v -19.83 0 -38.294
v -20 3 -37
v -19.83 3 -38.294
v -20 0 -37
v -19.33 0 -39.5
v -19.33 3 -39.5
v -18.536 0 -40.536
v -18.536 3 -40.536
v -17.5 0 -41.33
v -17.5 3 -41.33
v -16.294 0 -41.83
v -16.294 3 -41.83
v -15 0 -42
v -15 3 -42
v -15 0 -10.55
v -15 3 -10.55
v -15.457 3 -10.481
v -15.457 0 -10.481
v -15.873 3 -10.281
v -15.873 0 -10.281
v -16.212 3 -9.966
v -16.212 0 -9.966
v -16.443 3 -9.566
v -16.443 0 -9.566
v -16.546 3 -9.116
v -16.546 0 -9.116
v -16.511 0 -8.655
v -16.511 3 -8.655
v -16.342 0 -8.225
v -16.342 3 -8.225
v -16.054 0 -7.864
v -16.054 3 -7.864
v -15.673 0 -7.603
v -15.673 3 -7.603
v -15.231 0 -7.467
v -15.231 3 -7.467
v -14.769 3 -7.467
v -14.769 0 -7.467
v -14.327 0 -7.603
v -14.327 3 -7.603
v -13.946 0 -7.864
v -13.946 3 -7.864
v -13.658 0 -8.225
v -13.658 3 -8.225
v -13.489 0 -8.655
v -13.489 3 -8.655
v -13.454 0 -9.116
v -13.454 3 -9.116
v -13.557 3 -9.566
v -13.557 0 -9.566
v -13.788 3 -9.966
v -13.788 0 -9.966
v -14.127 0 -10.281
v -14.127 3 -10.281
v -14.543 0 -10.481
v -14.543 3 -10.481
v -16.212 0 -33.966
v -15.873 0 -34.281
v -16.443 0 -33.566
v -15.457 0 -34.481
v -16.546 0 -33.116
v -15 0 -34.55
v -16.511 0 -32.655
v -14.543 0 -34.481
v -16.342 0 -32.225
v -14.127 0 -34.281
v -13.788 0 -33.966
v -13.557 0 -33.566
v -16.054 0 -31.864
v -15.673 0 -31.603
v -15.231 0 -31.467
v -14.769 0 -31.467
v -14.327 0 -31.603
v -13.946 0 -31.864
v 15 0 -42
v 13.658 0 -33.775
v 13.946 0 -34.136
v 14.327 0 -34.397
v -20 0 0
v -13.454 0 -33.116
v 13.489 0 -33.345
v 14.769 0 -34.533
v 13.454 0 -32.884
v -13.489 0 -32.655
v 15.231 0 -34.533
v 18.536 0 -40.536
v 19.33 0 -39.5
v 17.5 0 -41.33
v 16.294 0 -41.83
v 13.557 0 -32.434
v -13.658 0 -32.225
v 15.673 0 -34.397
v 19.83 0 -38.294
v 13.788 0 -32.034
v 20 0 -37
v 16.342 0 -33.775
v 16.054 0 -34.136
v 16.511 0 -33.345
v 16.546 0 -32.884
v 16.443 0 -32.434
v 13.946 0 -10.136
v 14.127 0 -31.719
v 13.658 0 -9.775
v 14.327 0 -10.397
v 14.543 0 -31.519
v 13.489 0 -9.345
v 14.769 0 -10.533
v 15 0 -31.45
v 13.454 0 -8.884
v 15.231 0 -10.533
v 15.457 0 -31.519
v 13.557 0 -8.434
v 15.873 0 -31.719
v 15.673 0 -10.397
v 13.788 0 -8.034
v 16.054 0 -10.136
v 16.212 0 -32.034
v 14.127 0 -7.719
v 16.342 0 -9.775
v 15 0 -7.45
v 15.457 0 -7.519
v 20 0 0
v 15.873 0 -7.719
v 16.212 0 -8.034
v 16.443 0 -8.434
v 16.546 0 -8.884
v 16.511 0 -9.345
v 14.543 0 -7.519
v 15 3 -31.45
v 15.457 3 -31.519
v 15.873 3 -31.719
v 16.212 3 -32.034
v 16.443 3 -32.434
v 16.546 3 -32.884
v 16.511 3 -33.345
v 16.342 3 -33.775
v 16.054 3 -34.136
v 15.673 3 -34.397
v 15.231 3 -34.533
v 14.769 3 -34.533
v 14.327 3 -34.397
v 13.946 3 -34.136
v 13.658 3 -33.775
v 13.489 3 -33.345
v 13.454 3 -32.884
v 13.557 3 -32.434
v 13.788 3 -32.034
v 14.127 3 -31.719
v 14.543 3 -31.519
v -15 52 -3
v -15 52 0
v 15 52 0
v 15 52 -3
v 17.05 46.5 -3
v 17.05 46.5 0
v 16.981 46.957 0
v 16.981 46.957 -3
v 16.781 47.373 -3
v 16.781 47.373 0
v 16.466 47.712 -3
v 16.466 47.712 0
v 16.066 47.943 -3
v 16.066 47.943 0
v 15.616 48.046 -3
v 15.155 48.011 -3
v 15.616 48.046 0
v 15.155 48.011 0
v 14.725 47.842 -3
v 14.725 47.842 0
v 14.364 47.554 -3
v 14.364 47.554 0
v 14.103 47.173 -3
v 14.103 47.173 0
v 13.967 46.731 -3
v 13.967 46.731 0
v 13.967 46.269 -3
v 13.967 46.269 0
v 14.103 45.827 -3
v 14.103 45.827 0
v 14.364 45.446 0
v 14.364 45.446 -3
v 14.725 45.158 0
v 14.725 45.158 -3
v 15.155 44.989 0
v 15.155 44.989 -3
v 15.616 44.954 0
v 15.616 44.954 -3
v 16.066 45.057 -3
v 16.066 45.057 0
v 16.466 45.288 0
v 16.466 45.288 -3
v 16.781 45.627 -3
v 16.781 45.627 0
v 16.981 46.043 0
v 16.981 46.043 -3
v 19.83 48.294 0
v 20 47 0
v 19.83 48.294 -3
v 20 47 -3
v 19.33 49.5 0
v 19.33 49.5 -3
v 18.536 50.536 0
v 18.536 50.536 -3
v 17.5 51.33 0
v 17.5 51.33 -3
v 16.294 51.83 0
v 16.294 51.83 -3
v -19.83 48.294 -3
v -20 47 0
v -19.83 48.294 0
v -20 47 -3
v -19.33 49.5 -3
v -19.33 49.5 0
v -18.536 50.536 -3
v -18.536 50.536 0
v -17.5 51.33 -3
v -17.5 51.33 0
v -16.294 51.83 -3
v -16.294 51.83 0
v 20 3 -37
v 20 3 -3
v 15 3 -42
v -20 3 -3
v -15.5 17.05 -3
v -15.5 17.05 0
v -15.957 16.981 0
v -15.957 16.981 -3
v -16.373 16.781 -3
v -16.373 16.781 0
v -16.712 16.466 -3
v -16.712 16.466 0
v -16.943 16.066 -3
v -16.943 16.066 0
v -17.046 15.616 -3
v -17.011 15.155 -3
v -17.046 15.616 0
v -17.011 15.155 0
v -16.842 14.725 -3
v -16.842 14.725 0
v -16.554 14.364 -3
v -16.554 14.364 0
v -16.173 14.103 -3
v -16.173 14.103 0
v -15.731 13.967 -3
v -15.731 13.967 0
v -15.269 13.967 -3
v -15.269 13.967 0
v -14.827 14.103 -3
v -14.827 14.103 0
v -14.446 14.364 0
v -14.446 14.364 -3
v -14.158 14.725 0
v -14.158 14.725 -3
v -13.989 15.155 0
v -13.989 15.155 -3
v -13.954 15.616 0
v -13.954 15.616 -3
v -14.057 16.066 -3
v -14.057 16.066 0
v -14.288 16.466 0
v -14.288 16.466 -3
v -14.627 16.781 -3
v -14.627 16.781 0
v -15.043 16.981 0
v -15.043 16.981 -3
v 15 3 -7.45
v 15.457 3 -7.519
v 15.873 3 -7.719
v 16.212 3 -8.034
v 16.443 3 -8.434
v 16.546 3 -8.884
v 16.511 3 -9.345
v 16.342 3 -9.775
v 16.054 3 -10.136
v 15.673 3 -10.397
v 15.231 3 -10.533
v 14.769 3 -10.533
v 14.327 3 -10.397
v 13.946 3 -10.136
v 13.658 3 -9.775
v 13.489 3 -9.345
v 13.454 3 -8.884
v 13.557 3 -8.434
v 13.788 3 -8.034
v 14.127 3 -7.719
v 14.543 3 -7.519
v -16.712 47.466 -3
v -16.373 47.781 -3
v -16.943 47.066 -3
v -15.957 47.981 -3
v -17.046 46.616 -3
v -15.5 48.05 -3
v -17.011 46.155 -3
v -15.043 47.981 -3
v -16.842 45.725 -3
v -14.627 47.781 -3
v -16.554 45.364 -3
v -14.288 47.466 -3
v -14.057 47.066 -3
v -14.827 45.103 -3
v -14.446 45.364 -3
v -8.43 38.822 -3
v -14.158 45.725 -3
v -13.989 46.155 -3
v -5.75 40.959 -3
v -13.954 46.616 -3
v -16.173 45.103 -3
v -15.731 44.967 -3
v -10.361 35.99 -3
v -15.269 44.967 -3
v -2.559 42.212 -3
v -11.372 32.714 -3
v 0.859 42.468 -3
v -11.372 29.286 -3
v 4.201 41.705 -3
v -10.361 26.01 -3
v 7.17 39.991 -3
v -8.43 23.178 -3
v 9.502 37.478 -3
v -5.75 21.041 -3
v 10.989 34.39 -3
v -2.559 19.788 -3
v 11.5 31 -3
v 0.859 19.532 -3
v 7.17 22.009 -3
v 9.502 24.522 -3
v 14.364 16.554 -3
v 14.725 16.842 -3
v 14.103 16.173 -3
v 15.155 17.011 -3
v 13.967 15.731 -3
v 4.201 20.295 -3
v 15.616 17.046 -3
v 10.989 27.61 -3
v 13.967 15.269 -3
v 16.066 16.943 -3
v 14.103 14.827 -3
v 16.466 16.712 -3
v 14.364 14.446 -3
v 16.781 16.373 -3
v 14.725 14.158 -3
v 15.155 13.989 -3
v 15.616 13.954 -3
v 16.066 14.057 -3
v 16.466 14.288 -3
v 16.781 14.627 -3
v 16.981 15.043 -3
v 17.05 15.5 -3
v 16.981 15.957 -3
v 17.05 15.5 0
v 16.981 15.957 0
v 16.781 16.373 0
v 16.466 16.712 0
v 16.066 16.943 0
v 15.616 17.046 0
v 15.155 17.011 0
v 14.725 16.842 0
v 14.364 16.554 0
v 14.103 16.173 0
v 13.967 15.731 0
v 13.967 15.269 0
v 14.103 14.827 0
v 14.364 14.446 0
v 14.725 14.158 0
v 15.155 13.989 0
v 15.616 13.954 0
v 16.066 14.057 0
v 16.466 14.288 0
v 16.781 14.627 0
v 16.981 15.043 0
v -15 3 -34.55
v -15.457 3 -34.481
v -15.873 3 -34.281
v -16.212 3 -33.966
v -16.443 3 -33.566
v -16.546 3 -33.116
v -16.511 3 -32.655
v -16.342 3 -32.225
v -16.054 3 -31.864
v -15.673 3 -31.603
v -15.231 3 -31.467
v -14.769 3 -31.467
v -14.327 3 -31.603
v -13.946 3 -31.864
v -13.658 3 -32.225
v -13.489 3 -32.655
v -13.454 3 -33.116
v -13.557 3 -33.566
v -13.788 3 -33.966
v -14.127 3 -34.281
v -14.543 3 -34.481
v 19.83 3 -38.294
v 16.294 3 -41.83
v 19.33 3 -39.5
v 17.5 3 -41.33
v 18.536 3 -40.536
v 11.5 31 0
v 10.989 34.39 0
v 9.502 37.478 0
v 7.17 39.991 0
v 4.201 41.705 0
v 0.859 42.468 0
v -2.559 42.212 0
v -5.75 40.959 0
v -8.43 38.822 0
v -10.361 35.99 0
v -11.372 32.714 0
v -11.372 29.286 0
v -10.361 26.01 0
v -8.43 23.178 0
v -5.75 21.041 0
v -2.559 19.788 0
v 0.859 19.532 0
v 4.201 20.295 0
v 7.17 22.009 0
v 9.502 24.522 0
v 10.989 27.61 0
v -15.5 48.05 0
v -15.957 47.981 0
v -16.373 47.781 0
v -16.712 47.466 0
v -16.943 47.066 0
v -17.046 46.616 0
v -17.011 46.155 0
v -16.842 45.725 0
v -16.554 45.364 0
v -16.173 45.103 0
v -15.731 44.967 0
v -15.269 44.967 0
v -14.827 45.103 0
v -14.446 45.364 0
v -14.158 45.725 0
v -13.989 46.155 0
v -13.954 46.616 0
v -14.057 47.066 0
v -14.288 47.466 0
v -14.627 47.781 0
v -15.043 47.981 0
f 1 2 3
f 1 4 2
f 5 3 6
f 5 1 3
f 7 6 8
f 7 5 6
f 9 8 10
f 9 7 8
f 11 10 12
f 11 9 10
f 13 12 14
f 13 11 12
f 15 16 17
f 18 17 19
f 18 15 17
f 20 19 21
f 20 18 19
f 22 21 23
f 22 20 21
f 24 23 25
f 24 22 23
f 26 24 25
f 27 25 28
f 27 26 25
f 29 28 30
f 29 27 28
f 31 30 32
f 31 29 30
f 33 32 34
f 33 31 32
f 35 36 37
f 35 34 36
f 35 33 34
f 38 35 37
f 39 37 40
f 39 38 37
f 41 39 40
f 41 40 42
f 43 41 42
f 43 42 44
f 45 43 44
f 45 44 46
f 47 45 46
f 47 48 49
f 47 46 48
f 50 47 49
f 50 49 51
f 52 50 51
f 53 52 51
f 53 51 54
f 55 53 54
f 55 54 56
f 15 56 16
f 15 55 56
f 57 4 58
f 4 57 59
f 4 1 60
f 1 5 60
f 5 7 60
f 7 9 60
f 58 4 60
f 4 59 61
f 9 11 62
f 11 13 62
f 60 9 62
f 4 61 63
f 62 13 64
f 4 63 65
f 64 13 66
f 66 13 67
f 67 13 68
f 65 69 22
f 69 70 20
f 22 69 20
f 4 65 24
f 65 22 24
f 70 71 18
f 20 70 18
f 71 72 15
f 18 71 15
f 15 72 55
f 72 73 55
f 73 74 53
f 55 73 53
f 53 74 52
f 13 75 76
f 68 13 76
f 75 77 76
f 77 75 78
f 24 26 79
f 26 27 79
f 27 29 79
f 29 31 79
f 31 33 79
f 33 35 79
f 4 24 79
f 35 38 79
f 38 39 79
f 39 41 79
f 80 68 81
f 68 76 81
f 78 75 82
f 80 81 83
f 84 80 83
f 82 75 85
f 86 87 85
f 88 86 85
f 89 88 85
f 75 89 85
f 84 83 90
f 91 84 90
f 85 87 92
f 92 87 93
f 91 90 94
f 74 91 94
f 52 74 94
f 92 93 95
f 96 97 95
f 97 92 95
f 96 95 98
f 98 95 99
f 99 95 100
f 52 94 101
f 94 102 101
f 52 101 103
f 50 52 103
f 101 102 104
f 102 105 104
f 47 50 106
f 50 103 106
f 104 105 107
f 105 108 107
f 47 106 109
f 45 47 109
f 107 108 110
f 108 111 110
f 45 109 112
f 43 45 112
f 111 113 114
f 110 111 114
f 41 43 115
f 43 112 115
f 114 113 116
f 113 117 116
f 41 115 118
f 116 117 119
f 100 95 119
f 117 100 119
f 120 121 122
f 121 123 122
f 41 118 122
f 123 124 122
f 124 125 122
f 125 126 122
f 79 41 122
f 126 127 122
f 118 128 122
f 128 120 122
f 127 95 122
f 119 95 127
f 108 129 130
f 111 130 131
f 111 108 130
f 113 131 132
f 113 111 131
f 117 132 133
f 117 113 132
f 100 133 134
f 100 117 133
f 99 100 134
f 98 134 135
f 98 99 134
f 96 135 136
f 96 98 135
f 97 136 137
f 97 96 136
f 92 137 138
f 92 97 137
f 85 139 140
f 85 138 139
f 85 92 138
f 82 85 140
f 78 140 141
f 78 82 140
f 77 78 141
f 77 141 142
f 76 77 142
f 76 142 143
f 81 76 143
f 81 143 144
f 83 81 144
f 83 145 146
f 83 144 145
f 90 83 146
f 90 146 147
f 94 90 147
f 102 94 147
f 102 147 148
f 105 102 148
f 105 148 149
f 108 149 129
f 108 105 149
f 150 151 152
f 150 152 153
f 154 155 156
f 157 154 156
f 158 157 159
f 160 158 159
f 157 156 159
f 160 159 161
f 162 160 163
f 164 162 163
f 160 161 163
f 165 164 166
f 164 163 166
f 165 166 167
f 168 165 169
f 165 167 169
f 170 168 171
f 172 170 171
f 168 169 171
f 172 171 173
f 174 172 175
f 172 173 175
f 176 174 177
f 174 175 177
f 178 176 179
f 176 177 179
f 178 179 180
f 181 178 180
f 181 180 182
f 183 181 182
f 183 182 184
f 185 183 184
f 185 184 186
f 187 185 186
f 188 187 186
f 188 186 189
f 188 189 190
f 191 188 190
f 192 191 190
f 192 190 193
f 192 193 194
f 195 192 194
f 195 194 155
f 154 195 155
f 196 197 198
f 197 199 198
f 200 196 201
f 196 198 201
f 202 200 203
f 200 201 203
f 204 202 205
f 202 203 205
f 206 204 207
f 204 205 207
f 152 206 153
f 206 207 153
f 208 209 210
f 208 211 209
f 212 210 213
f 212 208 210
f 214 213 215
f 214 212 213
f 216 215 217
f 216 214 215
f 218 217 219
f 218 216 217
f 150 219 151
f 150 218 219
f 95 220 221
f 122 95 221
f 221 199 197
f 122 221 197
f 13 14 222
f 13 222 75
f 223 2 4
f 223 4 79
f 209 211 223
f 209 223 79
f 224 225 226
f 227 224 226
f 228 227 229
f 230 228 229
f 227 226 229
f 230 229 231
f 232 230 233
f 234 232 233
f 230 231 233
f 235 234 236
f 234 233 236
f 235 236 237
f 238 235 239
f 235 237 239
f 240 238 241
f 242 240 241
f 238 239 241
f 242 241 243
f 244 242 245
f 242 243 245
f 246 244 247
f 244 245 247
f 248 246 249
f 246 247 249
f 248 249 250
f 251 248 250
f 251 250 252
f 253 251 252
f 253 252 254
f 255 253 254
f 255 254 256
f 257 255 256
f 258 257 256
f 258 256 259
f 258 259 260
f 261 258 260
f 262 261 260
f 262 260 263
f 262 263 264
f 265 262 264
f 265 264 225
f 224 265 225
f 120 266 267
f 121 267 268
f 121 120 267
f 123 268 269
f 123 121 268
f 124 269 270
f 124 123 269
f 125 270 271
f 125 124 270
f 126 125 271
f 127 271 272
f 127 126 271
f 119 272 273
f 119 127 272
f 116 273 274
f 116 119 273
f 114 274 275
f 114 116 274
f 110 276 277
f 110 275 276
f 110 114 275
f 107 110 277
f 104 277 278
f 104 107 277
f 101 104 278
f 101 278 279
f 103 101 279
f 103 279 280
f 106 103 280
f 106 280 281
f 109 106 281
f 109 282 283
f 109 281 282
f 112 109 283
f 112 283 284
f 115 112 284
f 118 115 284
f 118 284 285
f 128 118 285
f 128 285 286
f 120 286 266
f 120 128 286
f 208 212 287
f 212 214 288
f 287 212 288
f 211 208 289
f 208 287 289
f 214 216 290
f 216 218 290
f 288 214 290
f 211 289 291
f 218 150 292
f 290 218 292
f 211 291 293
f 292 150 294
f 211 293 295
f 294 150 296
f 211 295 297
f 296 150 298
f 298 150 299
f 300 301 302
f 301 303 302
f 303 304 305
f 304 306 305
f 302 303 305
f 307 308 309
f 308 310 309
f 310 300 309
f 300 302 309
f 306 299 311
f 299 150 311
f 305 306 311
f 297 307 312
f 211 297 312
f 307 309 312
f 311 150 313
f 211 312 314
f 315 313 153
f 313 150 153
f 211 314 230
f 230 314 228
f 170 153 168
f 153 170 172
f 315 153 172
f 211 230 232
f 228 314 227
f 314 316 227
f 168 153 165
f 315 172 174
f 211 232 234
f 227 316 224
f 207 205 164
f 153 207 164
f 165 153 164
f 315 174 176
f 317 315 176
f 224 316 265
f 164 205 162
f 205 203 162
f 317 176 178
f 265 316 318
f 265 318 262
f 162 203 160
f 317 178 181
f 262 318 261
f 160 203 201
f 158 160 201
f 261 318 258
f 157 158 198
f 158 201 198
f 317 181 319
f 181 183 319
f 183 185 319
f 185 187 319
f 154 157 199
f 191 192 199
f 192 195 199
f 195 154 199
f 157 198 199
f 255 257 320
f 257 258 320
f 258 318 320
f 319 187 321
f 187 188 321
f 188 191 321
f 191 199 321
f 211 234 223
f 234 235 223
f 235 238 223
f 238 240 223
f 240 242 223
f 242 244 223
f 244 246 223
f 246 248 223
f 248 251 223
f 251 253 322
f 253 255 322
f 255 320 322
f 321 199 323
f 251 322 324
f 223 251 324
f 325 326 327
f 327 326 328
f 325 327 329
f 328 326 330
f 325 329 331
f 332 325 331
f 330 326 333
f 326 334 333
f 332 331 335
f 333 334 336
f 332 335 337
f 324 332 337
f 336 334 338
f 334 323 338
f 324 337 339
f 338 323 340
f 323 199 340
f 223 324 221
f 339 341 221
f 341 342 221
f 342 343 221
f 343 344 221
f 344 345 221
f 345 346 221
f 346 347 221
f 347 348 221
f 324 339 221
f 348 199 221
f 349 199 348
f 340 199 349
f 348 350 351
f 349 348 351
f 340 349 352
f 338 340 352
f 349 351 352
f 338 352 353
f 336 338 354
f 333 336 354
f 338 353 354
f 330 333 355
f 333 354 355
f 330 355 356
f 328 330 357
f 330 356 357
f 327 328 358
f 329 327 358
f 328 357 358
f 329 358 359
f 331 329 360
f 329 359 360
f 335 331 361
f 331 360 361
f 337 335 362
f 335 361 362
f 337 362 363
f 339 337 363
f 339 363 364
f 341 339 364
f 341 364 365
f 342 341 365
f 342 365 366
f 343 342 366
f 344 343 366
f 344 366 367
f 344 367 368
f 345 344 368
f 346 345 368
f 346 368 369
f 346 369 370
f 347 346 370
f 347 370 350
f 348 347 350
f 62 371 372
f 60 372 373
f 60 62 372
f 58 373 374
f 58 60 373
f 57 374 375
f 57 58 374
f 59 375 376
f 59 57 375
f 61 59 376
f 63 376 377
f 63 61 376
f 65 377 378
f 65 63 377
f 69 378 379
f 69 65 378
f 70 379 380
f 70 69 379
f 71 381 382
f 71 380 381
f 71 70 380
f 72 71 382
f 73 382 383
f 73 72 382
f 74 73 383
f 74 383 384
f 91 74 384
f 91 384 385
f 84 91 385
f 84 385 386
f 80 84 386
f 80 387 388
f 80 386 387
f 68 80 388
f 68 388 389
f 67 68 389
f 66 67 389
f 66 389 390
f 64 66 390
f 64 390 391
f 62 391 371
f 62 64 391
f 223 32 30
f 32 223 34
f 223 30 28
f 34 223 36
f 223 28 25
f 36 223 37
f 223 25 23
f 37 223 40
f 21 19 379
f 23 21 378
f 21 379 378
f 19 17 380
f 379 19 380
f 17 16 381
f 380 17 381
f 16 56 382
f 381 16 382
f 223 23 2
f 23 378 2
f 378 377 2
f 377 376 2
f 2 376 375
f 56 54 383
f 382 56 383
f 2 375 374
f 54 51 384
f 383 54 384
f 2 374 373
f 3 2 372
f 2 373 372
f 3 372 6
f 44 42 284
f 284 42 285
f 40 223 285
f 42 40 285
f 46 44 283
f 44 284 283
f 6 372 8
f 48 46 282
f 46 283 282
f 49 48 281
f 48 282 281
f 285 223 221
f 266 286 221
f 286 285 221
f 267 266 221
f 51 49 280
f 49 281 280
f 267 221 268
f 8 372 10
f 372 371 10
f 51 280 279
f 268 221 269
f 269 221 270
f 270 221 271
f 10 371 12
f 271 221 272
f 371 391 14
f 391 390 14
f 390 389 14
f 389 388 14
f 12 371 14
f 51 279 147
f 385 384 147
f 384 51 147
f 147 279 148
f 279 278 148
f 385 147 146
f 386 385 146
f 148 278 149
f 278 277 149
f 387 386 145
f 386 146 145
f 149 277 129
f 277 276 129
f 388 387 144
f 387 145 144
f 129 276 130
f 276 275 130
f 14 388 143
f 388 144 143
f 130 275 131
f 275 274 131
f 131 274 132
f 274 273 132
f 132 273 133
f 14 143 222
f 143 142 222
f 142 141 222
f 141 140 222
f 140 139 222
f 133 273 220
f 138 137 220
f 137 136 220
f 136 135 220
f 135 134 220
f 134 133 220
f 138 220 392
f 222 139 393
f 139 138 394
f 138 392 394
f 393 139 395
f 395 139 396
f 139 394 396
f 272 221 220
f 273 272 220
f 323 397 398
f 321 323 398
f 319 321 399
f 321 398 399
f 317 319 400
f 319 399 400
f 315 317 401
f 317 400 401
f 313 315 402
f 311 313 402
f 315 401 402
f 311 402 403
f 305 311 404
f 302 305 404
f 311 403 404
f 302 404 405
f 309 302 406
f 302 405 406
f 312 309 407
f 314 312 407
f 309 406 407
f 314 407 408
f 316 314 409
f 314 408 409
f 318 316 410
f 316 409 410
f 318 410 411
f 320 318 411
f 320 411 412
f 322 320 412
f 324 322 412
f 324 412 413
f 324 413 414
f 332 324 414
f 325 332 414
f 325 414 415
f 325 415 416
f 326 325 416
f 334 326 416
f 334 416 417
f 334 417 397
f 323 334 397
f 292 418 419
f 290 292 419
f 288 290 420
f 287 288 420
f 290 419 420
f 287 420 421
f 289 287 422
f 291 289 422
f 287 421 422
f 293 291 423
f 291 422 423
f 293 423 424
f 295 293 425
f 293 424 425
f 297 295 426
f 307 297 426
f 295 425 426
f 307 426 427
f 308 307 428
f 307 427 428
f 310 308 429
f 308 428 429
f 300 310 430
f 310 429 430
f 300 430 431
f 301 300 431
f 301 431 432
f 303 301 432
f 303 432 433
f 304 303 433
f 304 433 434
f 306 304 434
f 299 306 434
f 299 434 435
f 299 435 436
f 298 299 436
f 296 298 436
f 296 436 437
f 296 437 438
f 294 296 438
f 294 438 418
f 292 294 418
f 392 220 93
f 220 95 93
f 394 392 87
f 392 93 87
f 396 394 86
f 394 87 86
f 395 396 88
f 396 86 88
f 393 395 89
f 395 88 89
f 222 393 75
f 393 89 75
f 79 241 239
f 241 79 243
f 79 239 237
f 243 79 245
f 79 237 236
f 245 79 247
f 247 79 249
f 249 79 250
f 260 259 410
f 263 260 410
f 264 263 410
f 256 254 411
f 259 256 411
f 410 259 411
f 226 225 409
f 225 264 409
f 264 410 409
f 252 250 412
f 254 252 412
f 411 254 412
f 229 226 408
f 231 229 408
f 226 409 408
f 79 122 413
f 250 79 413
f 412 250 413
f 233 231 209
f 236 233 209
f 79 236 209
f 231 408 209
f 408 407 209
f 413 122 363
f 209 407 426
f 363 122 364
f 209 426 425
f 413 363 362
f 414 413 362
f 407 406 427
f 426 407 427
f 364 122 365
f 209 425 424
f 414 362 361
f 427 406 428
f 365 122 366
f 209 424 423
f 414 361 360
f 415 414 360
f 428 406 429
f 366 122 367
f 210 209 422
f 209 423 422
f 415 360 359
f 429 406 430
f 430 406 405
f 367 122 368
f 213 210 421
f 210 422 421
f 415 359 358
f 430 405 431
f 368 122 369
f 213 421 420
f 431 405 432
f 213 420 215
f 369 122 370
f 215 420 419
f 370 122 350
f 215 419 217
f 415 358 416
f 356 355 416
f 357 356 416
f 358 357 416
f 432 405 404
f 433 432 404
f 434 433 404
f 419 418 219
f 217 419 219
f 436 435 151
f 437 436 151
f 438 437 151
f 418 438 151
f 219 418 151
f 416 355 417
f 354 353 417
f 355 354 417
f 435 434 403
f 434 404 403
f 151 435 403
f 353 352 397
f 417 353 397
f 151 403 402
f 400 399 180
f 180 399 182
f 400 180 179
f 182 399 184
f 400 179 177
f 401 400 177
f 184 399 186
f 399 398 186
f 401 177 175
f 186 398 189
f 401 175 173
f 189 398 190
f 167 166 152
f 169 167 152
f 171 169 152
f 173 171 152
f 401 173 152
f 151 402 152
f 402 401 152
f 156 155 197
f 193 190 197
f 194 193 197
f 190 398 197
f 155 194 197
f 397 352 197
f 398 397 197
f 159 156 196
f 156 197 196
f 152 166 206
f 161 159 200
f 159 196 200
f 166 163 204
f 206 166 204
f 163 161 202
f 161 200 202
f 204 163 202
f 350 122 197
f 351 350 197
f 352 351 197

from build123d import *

# Parameters (mm, degrees)
EXTRUDE_1_DEPTH     = 20
CUT_EXTRUDE_1_REACH = 71.771
SKETCH_2_R          = 1.55
SKETCH_2_R_2        = 11.5
CUT_EXTRUDE_2_REACH = 71.771
SKETCH_3_R          = 1.55
FILLET_1_R          = 5


with BuildPart() as part:
    # 草图1 → 凸台-拉伸1 (new, symmetric)
    with BuildSketch(Plane(origin=(0, 0, 0), x_dir=(0, 0, -1), z_dir=(1, 0, 0))):
        Polygon((0, 0), (0, 52), (3, 52), (3, 3), (42, 3), (42, 0), align=None)
    extrude(amount=EXTRUDE_1_DEPTH, both=True)

    # 草图2 → 切除-拉伸1 (cut, up to next)
    with BuildSketch(Plane.XY, mode=Mode.PRIVATE) as cut_extrude_1_sk1:
        with Locations((15.5, 46.5)):
            Circle(SKETCH_2_R)
    cut_extrude_1_tool1 = extrude(cut_extrude_1_sk1.sketch, amount=-CUT_EXTRUDE_1_REACH, mode=Mode.PRIVATE) & part.part
    # 草图2 → 切除-拉伸1 (cut, up to next)
    with BuildSketch(Plane.XY, mode=Mode.PRIVATE) as cut_extrude_1_sk2:
        with Locations((15.5, 15.5)):
            Circle(SKETCH_2_R)
    cut_extrude_1_tool2 = extrude(cut_extrude_1_sk2.sketch, amount=-CUT_EXTRUDE_1_REACH, mode=Mode.PRIVATE) & part.part
    # 草图2 → 切除-拉伸1 (cut, up to next)
    with BuildSketch(Plane.XY, mode=Mode.PRIVATE) as cut_extrude_1_sk3:
        with Locations(Location((-15.5, 15.5, 0), (0, 0, 90))):
            Circle(SKETCH_2_R)
    cut_extrude_1_tool3 = extrude(cut_extrude_1_sk3.sketch, amount=-CUT_EXTRUDE_1_REACH, mode=Mode.PRIVATE) & part.part
    # 草图2 → 切除-拉伸1 (cut, up to next)
    with BuildSketch(Plane.XY, mode=Mode.PRIVATE) as cut_extrude_1_sk4:
        with Locations(Location((-15.5, 46.5, 0), (0, 0, 90))):
            Circle(SKETCH_2_R)
    cut_extrude_1_tool4 = extrude(cut_extrude_1_sk4.sketch, amount=-CUT_EXTRUDE_1_REACH, mode=Mode.PRIVATE) & part.part
    # 草图2 → 切除-拉伸1 (cut, up to next)
    with BuildSketch(Plane.XY, mode=Mode.PRIVATE) as cut_extrude_1_sk5:
        with Locations((0, 31)):
            Circle(SKETCH_2_R_2)
    cut_extrude_1_tool5 = extrude(cut_extrude_1_sk5.sketch, amount=-CUT_EXTRUDE_1_REACH, mode=Mode.PRIVATE) & part.part
    add(cut_extrude_1_tool1.solids().sort_by_distance((15.5, 46.5, 0))[0], mode=Mode.SUBTRACT)
    add(cut_extrude_1_tool2.solids().sort_by_distance((15.5, 15.5, 0))[0], mode=Mode.SUBTRACT)
    add(cut_extrude_1_tool3.solids().sort_by_distance((-15.5, 15.5, 0))[0], mode=Mode.SUBTRACT)
    add(cut_extrude_1_tool4.solids().sort_by_distance((-15.5, 46.5, 0))[0], mode=Mode.SUBTRACT)
    add(cut_extrude_1_tool5.solids().sort_by_distance((0, 31, 0))[0], mode=Mode.SUBTRACT)

    # 草图3 → 切除-拉伸2 (cut, up to next)
    with BuildSketch(Plane(origin=(0, 0, 0), x_dir=(1, 0, 0), z_dir=(0, 1, 0)), mode=Mode.PRIVATE) as cut_extrude_2_sk1:
        with Locations(Location((15, 33, 0), (0, 0, 270))):
            Circle(SKETCH_3_R)
    cut_extrude_2_tool1 = extrude(cut_extrude_2_sk1.sketch, amount=CUT_EXTRUDE_2_REACH, mode=Mode.PRIVATE) & part.part
    # 草图3 → 切除-拉伸2 (cut, up to next)
    with BuildSketch(Plane(origin=(0, 0, 0), x_dir=(1, 0, 0), z_dir=(0, 1, 0)), mode=Mode.PRIVATE) as cut_extrude_2_sk2:
        with Locations(Location((15, 9, 0), (0, 0, 270))):
            Circle(SKETCH_3_R)
    cut_extrude_2_tool2 = extrude(cut_extrude_2_sk2.sketch, amount=CUT_EXTRUDE_2_REACH, mode=Mode.PRIVATE) & part.part
    # 草图3 → 切除-拉伸2 (cut, up to next)
    with BuildSketch(Plane(origin=(0, 0, 0), x_dir=(1, 0, 0), z_dir=(0, 1, 0)), mode=Mode.PRIVATE) as cut_extrude_2_sk3:
        with Locations(Location((-15, 9, 0), (0, 0, 90))):
            Circle(SKETCH_3_R)
    cut_extrude_2_tool3 = extrude(cut_extrude_2_sk3.sketch, amount=CUT_EXTRUDE_2_REACH, mode=Mode.PRIVATE) & part.part
    # 草图3 → 切除-拉伸2 (cut, up to next)
    with BuildSketch(Plane(origin=(0, 0, 0), x_dir=(1, 0, 0), z_dir=(0, 1, 0)), mode=Mode.PRIVATE) as cut_extrude_2_sk4:
        with Locations(Location((-15, 33, 0), (0, 0, 90))):
            Circle(SKETCH_3_R)
    cut_extrude_2_tool4 = extrude(cut_extrude_2_sk4.sketch, amount=CUT_EXTRUDE_2_REACH, mode=Mode.PRIVATE) & part.part
    add(cut_extrude_2_tool1.solids().sort_by_distance((15, 0, -33))[0], mode=Mode.SUBTRACT)
    add(cut_extrude_2_tool2.solids().sort_by_distance((15, 0, -9))[0], mode=Mode.SUBTRACT)
    add(cut_extrude_2_tool3.solids().sort_by_distance((-15, 0, -9))[0], mode=Mode.SUBTRACT)
    add(cut_extrude_2_tool4.solids().sort_by_distance((-15, 0, -33))[0], mode=Mode.SUBTRACT)

    # 圆角1
    fillet_1_edges = [part.edges().sort_by_distance(p)[0] for p in [
        (-20, 52, -1.5),
        (20, 52, -1.5),
        (20, 1.5, -42),
        (-20, 1.5, -42),
    ]]
    fillet(fillet_1_edges, radius=FILLET_1_R)


solid = part.part
